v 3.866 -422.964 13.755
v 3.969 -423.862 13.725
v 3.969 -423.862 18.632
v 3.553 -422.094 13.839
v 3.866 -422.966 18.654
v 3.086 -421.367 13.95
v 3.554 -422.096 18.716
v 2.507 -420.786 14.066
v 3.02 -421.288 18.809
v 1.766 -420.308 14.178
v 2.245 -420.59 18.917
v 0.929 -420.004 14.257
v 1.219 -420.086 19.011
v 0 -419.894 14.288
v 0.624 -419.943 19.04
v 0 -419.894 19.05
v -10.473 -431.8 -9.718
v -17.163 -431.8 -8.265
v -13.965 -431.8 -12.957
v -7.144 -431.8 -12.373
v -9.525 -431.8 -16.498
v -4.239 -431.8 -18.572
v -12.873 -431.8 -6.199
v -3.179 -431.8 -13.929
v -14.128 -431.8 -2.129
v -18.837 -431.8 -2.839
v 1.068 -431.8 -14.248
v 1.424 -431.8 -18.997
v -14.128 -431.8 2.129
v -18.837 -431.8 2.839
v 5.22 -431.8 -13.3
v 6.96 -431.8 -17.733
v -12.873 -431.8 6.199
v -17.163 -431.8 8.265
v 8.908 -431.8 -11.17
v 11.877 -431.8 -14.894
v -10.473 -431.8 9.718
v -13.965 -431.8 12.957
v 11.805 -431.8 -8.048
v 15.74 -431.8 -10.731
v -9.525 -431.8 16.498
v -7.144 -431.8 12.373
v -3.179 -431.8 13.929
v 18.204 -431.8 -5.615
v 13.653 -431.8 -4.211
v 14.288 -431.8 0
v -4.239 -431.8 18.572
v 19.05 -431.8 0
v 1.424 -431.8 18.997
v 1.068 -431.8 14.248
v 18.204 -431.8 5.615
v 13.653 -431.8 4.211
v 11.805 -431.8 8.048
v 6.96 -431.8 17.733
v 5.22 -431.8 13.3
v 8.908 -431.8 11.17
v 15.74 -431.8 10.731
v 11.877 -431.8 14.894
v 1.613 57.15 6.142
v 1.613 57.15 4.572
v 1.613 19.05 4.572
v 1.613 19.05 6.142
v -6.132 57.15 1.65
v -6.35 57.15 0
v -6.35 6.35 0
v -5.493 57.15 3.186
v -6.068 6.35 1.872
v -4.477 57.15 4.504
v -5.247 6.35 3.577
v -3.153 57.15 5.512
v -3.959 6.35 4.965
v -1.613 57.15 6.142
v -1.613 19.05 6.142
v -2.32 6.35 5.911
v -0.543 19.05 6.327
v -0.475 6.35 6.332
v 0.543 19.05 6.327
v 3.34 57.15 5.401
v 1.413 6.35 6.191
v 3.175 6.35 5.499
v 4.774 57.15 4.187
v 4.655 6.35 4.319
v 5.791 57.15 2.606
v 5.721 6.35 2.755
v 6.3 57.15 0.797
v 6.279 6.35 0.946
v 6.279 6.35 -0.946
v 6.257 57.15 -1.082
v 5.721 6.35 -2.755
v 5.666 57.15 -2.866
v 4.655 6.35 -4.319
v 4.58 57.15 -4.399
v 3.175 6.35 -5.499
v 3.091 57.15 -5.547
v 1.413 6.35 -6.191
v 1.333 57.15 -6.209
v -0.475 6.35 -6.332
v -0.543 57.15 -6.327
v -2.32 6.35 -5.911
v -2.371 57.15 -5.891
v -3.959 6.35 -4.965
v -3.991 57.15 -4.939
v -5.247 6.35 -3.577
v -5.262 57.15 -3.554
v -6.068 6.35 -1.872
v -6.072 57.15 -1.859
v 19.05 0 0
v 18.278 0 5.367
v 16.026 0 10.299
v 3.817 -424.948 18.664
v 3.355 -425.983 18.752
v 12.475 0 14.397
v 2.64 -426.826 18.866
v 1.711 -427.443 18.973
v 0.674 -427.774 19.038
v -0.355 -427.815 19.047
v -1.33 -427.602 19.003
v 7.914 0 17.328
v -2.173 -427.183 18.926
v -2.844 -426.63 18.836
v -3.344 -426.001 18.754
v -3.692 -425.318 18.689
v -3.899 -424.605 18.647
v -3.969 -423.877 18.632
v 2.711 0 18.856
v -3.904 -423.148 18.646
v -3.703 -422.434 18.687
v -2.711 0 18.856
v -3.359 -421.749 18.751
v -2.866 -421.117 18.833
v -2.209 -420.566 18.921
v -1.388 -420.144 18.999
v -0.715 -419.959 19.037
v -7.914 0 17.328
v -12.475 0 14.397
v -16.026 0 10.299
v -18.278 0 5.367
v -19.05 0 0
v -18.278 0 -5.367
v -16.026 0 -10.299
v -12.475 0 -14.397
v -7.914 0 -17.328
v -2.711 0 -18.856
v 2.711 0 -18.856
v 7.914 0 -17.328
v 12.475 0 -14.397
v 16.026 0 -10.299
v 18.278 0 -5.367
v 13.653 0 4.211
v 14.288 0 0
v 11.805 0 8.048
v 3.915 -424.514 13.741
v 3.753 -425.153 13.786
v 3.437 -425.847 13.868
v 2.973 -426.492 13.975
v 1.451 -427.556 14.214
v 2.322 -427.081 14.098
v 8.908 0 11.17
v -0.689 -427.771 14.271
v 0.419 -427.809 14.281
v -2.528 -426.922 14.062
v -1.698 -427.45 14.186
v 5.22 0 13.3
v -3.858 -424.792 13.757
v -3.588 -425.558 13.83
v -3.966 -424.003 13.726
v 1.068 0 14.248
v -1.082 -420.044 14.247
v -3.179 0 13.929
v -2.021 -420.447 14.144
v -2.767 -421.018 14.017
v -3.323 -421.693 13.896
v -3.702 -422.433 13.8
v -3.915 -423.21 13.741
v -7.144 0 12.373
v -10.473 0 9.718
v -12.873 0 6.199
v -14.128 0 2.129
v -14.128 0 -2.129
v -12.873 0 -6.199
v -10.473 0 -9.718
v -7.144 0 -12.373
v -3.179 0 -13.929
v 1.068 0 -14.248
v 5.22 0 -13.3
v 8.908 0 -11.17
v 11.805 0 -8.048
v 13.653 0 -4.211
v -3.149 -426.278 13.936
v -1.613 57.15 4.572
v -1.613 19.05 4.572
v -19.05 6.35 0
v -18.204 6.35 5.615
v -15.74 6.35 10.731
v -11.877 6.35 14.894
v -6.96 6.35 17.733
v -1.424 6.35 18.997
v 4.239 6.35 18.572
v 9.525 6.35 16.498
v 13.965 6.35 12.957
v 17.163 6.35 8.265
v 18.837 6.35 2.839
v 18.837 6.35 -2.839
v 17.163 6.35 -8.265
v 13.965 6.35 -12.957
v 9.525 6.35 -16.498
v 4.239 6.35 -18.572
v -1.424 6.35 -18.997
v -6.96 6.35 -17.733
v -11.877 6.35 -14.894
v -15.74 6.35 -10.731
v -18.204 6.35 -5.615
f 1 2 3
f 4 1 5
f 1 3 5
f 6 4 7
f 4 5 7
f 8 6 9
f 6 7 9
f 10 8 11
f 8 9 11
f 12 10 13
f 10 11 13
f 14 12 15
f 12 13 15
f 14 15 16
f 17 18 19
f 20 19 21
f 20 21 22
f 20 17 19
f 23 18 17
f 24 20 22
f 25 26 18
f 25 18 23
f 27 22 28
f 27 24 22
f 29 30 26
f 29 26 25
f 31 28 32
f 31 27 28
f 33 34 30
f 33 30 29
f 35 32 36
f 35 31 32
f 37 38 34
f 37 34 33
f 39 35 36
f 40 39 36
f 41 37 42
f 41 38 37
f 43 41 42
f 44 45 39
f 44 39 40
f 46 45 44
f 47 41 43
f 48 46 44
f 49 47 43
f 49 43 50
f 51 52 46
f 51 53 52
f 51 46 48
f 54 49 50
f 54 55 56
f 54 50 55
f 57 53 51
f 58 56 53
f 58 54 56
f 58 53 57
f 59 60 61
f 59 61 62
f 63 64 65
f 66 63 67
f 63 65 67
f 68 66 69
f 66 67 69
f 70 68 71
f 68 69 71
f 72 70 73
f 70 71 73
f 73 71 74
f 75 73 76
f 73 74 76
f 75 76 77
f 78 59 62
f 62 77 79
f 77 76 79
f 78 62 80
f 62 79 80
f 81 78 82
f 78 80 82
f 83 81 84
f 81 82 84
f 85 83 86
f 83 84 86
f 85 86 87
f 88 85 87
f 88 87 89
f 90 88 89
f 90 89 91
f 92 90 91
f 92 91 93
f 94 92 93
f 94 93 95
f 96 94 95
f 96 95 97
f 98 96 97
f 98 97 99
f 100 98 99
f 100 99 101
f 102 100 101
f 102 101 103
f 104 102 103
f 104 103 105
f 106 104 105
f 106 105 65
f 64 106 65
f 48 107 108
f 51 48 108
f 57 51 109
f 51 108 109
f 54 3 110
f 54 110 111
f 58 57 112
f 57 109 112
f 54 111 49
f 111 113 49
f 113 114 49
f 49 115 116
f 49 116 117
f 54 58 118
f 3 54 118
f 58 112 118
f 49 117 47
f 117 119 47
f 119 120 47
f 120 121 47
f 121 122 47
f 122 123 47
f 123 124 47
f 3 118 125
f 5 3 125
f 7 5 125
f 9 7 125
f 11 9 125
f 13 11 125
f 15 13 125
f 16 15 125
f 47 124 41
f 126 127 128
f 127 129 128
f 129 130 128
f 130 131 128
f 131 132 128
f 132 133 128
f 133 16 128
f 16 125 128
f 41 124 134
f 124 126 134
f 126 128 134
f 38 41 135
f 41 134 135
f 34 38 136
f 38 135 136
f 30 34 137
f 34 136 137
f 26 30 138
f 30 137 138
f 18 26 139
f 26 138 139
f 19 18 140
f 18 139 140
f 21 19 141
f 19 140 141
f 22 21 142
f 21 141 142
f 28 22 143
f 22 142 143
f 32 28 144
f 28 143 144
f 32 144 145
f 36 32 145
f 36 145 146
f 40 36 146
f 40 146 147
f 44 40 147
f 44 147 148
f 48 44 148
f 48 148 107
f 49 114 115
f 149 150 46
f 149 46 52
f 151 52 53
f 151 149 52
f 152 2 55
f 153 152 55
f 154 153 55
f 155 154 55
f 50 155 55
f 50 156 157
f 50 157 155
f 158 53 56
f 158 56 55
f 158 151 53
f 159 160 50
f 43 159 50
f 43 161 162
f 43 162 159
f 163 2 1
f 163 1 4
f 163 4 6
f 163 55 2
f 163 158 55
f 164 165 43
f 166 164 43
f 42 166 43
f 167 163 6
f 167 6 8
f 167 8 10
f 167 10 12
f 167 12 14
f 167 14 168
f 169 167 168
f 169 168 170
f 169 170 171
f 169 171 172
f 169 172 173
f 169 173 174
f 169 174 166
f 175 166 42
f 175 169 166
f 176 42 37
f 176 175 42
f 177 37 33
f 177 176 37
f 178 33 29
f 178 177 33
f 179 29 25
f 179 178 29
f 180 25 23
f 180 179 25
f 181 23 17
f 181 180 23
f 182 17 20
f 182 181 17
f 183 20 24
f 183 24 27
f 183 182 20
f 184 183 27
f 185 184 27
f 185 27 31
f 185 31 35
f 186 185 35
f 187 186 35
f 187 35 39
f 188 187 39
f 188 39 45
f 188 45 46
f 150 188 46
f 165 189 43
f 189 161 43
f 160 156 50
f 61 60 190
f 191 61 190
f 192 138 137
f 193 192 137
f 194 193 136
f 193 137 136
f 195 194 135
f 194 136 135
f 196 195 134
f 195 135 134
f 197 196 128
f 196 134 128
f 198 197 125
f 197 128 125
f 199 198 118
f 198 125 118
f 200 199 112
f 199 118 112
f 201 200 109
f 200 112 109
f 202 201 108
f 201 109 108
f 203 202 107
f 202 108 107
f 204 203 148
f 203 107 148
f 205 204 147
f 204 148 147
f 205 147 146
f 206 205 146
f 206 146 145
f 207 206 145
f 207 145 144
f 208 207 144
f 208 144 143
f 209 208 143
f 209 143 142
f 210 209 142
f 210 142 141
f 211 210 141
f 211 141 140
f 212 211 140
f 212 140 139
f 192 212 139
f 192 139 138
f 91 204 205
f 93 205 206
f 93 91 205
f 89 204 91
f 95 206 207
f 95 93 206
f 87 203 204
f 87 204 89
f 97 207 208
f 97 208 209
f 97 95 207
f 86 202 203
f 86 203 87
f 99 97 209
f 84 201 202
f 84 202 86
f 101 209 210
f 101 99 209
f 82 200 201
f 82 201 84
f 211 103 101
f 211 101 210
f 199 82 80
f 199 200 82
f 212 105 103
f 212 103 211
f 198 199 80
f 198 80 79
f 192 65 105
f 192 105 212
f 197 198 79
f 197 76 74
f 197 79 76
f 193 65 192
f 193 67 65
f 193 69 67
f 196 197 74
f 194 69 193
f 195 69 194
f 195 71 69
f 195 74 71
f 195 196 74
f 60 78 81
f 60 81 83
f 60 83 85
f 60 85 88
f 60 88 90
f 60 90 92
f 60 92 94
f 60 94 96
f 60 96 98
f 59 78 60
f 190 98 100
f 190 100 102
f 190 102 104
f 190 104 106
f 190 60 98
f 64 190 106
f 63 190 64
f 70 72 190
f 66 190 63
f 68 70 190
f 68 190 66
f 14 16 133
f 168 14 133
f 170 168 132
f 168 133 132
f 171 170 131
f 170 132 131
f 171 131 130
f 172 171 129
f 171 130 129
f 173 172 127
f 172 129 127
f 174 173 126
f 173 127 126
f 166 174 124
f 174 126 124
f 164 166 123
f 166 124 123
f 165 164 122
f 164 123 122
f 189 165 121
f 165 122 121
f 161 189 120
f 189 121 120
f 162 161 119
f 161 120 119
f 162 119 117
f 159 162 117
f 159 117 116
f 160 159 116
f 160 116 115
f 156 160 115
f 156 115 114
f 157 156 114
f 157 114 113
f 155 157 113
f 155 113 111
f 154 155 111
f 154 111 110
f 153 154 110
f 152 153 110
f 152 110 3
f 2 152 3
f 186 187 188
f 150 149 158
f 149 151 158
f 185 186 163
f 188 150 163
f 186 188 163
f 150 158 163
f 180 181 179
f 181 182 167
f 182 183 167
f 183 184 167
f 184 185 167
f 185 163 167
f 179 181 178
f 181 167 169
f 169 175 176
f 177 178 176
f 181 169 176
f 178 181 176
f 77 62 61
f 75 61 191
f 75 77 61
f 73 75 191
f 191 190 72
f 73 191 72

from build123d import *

# Parameters (mm, degrees)
F0_R      = 19.05
F0_R_2    = 14.2875
F1_DEPTH  = 431.8
F2_R      = 19.05
F3_DEPTH  = 6.35
F4_R      = 6.35
F5_DEPTH  = 50.8
F6_W      = 1.6129
F6_H      = 1.778
F7_DEPTH  = 38.1
F10_DEPTH = 9.525


with BuildPart() as f1:
    # F0 (on Front) → F1 (new body)
    with BuildSketch(Plane.XZ):
        Circle(F0_R)
        Circle(F0_R_2, mode=Mode.SUBTRACT)
    extrude(amount=F1_DEPTH)

    # F2 (on face) → F3 (join)
    with BuildSketch(Plane(origin=(0, 0, 0), x_dir=(-1, 0, 0), z_dir=(0, 1, 0))):
        Circle(F2_R)
    extrude(amount=F3_DEPTH)

    # F4 (on face) → F5 (join)
    with BuildSketch(Plane(origin=(0, 6.35, 0), x_dir=(-1, 0, 0), z_dir=(0, 1, 0))):
        Circle(F4_R)
    extrude(amount=F5_DEPTH)

    # F6 (on face) → F7 (cut)
    with BuildSketch(Plane(origin=(0, 57.15, 0), x_dir=(-1, 0, 0), z_dir=(0, 1, 0))):
        with Locations((-0.80645, 5.461)):
            Rectangle(F6_W, F6_H)
        with Locations((0.80645, 5.461)):
            Rectangle(F6_W, F6_H)
    extrude(amount=-F7_DEPTH, mode=Mode.SUBTRACT)

    # F9 (on offset) → F10 (cut)
    with BuildSketch(Plane.XY.offset(19.05)):
        with BuildLine():
            ThreePointArc((0, -419.89375), (-2.80633, -426.66883), (3.96875, -423.8625))
            ThreePointArc((3.96875, -423.8625), (2.80633, -421.05617), (0, -419.89375))
        make_face()
    extrude(amount=-F10_DEPTH, mode=Mode.SUBTRACT)


solid = f1.part
